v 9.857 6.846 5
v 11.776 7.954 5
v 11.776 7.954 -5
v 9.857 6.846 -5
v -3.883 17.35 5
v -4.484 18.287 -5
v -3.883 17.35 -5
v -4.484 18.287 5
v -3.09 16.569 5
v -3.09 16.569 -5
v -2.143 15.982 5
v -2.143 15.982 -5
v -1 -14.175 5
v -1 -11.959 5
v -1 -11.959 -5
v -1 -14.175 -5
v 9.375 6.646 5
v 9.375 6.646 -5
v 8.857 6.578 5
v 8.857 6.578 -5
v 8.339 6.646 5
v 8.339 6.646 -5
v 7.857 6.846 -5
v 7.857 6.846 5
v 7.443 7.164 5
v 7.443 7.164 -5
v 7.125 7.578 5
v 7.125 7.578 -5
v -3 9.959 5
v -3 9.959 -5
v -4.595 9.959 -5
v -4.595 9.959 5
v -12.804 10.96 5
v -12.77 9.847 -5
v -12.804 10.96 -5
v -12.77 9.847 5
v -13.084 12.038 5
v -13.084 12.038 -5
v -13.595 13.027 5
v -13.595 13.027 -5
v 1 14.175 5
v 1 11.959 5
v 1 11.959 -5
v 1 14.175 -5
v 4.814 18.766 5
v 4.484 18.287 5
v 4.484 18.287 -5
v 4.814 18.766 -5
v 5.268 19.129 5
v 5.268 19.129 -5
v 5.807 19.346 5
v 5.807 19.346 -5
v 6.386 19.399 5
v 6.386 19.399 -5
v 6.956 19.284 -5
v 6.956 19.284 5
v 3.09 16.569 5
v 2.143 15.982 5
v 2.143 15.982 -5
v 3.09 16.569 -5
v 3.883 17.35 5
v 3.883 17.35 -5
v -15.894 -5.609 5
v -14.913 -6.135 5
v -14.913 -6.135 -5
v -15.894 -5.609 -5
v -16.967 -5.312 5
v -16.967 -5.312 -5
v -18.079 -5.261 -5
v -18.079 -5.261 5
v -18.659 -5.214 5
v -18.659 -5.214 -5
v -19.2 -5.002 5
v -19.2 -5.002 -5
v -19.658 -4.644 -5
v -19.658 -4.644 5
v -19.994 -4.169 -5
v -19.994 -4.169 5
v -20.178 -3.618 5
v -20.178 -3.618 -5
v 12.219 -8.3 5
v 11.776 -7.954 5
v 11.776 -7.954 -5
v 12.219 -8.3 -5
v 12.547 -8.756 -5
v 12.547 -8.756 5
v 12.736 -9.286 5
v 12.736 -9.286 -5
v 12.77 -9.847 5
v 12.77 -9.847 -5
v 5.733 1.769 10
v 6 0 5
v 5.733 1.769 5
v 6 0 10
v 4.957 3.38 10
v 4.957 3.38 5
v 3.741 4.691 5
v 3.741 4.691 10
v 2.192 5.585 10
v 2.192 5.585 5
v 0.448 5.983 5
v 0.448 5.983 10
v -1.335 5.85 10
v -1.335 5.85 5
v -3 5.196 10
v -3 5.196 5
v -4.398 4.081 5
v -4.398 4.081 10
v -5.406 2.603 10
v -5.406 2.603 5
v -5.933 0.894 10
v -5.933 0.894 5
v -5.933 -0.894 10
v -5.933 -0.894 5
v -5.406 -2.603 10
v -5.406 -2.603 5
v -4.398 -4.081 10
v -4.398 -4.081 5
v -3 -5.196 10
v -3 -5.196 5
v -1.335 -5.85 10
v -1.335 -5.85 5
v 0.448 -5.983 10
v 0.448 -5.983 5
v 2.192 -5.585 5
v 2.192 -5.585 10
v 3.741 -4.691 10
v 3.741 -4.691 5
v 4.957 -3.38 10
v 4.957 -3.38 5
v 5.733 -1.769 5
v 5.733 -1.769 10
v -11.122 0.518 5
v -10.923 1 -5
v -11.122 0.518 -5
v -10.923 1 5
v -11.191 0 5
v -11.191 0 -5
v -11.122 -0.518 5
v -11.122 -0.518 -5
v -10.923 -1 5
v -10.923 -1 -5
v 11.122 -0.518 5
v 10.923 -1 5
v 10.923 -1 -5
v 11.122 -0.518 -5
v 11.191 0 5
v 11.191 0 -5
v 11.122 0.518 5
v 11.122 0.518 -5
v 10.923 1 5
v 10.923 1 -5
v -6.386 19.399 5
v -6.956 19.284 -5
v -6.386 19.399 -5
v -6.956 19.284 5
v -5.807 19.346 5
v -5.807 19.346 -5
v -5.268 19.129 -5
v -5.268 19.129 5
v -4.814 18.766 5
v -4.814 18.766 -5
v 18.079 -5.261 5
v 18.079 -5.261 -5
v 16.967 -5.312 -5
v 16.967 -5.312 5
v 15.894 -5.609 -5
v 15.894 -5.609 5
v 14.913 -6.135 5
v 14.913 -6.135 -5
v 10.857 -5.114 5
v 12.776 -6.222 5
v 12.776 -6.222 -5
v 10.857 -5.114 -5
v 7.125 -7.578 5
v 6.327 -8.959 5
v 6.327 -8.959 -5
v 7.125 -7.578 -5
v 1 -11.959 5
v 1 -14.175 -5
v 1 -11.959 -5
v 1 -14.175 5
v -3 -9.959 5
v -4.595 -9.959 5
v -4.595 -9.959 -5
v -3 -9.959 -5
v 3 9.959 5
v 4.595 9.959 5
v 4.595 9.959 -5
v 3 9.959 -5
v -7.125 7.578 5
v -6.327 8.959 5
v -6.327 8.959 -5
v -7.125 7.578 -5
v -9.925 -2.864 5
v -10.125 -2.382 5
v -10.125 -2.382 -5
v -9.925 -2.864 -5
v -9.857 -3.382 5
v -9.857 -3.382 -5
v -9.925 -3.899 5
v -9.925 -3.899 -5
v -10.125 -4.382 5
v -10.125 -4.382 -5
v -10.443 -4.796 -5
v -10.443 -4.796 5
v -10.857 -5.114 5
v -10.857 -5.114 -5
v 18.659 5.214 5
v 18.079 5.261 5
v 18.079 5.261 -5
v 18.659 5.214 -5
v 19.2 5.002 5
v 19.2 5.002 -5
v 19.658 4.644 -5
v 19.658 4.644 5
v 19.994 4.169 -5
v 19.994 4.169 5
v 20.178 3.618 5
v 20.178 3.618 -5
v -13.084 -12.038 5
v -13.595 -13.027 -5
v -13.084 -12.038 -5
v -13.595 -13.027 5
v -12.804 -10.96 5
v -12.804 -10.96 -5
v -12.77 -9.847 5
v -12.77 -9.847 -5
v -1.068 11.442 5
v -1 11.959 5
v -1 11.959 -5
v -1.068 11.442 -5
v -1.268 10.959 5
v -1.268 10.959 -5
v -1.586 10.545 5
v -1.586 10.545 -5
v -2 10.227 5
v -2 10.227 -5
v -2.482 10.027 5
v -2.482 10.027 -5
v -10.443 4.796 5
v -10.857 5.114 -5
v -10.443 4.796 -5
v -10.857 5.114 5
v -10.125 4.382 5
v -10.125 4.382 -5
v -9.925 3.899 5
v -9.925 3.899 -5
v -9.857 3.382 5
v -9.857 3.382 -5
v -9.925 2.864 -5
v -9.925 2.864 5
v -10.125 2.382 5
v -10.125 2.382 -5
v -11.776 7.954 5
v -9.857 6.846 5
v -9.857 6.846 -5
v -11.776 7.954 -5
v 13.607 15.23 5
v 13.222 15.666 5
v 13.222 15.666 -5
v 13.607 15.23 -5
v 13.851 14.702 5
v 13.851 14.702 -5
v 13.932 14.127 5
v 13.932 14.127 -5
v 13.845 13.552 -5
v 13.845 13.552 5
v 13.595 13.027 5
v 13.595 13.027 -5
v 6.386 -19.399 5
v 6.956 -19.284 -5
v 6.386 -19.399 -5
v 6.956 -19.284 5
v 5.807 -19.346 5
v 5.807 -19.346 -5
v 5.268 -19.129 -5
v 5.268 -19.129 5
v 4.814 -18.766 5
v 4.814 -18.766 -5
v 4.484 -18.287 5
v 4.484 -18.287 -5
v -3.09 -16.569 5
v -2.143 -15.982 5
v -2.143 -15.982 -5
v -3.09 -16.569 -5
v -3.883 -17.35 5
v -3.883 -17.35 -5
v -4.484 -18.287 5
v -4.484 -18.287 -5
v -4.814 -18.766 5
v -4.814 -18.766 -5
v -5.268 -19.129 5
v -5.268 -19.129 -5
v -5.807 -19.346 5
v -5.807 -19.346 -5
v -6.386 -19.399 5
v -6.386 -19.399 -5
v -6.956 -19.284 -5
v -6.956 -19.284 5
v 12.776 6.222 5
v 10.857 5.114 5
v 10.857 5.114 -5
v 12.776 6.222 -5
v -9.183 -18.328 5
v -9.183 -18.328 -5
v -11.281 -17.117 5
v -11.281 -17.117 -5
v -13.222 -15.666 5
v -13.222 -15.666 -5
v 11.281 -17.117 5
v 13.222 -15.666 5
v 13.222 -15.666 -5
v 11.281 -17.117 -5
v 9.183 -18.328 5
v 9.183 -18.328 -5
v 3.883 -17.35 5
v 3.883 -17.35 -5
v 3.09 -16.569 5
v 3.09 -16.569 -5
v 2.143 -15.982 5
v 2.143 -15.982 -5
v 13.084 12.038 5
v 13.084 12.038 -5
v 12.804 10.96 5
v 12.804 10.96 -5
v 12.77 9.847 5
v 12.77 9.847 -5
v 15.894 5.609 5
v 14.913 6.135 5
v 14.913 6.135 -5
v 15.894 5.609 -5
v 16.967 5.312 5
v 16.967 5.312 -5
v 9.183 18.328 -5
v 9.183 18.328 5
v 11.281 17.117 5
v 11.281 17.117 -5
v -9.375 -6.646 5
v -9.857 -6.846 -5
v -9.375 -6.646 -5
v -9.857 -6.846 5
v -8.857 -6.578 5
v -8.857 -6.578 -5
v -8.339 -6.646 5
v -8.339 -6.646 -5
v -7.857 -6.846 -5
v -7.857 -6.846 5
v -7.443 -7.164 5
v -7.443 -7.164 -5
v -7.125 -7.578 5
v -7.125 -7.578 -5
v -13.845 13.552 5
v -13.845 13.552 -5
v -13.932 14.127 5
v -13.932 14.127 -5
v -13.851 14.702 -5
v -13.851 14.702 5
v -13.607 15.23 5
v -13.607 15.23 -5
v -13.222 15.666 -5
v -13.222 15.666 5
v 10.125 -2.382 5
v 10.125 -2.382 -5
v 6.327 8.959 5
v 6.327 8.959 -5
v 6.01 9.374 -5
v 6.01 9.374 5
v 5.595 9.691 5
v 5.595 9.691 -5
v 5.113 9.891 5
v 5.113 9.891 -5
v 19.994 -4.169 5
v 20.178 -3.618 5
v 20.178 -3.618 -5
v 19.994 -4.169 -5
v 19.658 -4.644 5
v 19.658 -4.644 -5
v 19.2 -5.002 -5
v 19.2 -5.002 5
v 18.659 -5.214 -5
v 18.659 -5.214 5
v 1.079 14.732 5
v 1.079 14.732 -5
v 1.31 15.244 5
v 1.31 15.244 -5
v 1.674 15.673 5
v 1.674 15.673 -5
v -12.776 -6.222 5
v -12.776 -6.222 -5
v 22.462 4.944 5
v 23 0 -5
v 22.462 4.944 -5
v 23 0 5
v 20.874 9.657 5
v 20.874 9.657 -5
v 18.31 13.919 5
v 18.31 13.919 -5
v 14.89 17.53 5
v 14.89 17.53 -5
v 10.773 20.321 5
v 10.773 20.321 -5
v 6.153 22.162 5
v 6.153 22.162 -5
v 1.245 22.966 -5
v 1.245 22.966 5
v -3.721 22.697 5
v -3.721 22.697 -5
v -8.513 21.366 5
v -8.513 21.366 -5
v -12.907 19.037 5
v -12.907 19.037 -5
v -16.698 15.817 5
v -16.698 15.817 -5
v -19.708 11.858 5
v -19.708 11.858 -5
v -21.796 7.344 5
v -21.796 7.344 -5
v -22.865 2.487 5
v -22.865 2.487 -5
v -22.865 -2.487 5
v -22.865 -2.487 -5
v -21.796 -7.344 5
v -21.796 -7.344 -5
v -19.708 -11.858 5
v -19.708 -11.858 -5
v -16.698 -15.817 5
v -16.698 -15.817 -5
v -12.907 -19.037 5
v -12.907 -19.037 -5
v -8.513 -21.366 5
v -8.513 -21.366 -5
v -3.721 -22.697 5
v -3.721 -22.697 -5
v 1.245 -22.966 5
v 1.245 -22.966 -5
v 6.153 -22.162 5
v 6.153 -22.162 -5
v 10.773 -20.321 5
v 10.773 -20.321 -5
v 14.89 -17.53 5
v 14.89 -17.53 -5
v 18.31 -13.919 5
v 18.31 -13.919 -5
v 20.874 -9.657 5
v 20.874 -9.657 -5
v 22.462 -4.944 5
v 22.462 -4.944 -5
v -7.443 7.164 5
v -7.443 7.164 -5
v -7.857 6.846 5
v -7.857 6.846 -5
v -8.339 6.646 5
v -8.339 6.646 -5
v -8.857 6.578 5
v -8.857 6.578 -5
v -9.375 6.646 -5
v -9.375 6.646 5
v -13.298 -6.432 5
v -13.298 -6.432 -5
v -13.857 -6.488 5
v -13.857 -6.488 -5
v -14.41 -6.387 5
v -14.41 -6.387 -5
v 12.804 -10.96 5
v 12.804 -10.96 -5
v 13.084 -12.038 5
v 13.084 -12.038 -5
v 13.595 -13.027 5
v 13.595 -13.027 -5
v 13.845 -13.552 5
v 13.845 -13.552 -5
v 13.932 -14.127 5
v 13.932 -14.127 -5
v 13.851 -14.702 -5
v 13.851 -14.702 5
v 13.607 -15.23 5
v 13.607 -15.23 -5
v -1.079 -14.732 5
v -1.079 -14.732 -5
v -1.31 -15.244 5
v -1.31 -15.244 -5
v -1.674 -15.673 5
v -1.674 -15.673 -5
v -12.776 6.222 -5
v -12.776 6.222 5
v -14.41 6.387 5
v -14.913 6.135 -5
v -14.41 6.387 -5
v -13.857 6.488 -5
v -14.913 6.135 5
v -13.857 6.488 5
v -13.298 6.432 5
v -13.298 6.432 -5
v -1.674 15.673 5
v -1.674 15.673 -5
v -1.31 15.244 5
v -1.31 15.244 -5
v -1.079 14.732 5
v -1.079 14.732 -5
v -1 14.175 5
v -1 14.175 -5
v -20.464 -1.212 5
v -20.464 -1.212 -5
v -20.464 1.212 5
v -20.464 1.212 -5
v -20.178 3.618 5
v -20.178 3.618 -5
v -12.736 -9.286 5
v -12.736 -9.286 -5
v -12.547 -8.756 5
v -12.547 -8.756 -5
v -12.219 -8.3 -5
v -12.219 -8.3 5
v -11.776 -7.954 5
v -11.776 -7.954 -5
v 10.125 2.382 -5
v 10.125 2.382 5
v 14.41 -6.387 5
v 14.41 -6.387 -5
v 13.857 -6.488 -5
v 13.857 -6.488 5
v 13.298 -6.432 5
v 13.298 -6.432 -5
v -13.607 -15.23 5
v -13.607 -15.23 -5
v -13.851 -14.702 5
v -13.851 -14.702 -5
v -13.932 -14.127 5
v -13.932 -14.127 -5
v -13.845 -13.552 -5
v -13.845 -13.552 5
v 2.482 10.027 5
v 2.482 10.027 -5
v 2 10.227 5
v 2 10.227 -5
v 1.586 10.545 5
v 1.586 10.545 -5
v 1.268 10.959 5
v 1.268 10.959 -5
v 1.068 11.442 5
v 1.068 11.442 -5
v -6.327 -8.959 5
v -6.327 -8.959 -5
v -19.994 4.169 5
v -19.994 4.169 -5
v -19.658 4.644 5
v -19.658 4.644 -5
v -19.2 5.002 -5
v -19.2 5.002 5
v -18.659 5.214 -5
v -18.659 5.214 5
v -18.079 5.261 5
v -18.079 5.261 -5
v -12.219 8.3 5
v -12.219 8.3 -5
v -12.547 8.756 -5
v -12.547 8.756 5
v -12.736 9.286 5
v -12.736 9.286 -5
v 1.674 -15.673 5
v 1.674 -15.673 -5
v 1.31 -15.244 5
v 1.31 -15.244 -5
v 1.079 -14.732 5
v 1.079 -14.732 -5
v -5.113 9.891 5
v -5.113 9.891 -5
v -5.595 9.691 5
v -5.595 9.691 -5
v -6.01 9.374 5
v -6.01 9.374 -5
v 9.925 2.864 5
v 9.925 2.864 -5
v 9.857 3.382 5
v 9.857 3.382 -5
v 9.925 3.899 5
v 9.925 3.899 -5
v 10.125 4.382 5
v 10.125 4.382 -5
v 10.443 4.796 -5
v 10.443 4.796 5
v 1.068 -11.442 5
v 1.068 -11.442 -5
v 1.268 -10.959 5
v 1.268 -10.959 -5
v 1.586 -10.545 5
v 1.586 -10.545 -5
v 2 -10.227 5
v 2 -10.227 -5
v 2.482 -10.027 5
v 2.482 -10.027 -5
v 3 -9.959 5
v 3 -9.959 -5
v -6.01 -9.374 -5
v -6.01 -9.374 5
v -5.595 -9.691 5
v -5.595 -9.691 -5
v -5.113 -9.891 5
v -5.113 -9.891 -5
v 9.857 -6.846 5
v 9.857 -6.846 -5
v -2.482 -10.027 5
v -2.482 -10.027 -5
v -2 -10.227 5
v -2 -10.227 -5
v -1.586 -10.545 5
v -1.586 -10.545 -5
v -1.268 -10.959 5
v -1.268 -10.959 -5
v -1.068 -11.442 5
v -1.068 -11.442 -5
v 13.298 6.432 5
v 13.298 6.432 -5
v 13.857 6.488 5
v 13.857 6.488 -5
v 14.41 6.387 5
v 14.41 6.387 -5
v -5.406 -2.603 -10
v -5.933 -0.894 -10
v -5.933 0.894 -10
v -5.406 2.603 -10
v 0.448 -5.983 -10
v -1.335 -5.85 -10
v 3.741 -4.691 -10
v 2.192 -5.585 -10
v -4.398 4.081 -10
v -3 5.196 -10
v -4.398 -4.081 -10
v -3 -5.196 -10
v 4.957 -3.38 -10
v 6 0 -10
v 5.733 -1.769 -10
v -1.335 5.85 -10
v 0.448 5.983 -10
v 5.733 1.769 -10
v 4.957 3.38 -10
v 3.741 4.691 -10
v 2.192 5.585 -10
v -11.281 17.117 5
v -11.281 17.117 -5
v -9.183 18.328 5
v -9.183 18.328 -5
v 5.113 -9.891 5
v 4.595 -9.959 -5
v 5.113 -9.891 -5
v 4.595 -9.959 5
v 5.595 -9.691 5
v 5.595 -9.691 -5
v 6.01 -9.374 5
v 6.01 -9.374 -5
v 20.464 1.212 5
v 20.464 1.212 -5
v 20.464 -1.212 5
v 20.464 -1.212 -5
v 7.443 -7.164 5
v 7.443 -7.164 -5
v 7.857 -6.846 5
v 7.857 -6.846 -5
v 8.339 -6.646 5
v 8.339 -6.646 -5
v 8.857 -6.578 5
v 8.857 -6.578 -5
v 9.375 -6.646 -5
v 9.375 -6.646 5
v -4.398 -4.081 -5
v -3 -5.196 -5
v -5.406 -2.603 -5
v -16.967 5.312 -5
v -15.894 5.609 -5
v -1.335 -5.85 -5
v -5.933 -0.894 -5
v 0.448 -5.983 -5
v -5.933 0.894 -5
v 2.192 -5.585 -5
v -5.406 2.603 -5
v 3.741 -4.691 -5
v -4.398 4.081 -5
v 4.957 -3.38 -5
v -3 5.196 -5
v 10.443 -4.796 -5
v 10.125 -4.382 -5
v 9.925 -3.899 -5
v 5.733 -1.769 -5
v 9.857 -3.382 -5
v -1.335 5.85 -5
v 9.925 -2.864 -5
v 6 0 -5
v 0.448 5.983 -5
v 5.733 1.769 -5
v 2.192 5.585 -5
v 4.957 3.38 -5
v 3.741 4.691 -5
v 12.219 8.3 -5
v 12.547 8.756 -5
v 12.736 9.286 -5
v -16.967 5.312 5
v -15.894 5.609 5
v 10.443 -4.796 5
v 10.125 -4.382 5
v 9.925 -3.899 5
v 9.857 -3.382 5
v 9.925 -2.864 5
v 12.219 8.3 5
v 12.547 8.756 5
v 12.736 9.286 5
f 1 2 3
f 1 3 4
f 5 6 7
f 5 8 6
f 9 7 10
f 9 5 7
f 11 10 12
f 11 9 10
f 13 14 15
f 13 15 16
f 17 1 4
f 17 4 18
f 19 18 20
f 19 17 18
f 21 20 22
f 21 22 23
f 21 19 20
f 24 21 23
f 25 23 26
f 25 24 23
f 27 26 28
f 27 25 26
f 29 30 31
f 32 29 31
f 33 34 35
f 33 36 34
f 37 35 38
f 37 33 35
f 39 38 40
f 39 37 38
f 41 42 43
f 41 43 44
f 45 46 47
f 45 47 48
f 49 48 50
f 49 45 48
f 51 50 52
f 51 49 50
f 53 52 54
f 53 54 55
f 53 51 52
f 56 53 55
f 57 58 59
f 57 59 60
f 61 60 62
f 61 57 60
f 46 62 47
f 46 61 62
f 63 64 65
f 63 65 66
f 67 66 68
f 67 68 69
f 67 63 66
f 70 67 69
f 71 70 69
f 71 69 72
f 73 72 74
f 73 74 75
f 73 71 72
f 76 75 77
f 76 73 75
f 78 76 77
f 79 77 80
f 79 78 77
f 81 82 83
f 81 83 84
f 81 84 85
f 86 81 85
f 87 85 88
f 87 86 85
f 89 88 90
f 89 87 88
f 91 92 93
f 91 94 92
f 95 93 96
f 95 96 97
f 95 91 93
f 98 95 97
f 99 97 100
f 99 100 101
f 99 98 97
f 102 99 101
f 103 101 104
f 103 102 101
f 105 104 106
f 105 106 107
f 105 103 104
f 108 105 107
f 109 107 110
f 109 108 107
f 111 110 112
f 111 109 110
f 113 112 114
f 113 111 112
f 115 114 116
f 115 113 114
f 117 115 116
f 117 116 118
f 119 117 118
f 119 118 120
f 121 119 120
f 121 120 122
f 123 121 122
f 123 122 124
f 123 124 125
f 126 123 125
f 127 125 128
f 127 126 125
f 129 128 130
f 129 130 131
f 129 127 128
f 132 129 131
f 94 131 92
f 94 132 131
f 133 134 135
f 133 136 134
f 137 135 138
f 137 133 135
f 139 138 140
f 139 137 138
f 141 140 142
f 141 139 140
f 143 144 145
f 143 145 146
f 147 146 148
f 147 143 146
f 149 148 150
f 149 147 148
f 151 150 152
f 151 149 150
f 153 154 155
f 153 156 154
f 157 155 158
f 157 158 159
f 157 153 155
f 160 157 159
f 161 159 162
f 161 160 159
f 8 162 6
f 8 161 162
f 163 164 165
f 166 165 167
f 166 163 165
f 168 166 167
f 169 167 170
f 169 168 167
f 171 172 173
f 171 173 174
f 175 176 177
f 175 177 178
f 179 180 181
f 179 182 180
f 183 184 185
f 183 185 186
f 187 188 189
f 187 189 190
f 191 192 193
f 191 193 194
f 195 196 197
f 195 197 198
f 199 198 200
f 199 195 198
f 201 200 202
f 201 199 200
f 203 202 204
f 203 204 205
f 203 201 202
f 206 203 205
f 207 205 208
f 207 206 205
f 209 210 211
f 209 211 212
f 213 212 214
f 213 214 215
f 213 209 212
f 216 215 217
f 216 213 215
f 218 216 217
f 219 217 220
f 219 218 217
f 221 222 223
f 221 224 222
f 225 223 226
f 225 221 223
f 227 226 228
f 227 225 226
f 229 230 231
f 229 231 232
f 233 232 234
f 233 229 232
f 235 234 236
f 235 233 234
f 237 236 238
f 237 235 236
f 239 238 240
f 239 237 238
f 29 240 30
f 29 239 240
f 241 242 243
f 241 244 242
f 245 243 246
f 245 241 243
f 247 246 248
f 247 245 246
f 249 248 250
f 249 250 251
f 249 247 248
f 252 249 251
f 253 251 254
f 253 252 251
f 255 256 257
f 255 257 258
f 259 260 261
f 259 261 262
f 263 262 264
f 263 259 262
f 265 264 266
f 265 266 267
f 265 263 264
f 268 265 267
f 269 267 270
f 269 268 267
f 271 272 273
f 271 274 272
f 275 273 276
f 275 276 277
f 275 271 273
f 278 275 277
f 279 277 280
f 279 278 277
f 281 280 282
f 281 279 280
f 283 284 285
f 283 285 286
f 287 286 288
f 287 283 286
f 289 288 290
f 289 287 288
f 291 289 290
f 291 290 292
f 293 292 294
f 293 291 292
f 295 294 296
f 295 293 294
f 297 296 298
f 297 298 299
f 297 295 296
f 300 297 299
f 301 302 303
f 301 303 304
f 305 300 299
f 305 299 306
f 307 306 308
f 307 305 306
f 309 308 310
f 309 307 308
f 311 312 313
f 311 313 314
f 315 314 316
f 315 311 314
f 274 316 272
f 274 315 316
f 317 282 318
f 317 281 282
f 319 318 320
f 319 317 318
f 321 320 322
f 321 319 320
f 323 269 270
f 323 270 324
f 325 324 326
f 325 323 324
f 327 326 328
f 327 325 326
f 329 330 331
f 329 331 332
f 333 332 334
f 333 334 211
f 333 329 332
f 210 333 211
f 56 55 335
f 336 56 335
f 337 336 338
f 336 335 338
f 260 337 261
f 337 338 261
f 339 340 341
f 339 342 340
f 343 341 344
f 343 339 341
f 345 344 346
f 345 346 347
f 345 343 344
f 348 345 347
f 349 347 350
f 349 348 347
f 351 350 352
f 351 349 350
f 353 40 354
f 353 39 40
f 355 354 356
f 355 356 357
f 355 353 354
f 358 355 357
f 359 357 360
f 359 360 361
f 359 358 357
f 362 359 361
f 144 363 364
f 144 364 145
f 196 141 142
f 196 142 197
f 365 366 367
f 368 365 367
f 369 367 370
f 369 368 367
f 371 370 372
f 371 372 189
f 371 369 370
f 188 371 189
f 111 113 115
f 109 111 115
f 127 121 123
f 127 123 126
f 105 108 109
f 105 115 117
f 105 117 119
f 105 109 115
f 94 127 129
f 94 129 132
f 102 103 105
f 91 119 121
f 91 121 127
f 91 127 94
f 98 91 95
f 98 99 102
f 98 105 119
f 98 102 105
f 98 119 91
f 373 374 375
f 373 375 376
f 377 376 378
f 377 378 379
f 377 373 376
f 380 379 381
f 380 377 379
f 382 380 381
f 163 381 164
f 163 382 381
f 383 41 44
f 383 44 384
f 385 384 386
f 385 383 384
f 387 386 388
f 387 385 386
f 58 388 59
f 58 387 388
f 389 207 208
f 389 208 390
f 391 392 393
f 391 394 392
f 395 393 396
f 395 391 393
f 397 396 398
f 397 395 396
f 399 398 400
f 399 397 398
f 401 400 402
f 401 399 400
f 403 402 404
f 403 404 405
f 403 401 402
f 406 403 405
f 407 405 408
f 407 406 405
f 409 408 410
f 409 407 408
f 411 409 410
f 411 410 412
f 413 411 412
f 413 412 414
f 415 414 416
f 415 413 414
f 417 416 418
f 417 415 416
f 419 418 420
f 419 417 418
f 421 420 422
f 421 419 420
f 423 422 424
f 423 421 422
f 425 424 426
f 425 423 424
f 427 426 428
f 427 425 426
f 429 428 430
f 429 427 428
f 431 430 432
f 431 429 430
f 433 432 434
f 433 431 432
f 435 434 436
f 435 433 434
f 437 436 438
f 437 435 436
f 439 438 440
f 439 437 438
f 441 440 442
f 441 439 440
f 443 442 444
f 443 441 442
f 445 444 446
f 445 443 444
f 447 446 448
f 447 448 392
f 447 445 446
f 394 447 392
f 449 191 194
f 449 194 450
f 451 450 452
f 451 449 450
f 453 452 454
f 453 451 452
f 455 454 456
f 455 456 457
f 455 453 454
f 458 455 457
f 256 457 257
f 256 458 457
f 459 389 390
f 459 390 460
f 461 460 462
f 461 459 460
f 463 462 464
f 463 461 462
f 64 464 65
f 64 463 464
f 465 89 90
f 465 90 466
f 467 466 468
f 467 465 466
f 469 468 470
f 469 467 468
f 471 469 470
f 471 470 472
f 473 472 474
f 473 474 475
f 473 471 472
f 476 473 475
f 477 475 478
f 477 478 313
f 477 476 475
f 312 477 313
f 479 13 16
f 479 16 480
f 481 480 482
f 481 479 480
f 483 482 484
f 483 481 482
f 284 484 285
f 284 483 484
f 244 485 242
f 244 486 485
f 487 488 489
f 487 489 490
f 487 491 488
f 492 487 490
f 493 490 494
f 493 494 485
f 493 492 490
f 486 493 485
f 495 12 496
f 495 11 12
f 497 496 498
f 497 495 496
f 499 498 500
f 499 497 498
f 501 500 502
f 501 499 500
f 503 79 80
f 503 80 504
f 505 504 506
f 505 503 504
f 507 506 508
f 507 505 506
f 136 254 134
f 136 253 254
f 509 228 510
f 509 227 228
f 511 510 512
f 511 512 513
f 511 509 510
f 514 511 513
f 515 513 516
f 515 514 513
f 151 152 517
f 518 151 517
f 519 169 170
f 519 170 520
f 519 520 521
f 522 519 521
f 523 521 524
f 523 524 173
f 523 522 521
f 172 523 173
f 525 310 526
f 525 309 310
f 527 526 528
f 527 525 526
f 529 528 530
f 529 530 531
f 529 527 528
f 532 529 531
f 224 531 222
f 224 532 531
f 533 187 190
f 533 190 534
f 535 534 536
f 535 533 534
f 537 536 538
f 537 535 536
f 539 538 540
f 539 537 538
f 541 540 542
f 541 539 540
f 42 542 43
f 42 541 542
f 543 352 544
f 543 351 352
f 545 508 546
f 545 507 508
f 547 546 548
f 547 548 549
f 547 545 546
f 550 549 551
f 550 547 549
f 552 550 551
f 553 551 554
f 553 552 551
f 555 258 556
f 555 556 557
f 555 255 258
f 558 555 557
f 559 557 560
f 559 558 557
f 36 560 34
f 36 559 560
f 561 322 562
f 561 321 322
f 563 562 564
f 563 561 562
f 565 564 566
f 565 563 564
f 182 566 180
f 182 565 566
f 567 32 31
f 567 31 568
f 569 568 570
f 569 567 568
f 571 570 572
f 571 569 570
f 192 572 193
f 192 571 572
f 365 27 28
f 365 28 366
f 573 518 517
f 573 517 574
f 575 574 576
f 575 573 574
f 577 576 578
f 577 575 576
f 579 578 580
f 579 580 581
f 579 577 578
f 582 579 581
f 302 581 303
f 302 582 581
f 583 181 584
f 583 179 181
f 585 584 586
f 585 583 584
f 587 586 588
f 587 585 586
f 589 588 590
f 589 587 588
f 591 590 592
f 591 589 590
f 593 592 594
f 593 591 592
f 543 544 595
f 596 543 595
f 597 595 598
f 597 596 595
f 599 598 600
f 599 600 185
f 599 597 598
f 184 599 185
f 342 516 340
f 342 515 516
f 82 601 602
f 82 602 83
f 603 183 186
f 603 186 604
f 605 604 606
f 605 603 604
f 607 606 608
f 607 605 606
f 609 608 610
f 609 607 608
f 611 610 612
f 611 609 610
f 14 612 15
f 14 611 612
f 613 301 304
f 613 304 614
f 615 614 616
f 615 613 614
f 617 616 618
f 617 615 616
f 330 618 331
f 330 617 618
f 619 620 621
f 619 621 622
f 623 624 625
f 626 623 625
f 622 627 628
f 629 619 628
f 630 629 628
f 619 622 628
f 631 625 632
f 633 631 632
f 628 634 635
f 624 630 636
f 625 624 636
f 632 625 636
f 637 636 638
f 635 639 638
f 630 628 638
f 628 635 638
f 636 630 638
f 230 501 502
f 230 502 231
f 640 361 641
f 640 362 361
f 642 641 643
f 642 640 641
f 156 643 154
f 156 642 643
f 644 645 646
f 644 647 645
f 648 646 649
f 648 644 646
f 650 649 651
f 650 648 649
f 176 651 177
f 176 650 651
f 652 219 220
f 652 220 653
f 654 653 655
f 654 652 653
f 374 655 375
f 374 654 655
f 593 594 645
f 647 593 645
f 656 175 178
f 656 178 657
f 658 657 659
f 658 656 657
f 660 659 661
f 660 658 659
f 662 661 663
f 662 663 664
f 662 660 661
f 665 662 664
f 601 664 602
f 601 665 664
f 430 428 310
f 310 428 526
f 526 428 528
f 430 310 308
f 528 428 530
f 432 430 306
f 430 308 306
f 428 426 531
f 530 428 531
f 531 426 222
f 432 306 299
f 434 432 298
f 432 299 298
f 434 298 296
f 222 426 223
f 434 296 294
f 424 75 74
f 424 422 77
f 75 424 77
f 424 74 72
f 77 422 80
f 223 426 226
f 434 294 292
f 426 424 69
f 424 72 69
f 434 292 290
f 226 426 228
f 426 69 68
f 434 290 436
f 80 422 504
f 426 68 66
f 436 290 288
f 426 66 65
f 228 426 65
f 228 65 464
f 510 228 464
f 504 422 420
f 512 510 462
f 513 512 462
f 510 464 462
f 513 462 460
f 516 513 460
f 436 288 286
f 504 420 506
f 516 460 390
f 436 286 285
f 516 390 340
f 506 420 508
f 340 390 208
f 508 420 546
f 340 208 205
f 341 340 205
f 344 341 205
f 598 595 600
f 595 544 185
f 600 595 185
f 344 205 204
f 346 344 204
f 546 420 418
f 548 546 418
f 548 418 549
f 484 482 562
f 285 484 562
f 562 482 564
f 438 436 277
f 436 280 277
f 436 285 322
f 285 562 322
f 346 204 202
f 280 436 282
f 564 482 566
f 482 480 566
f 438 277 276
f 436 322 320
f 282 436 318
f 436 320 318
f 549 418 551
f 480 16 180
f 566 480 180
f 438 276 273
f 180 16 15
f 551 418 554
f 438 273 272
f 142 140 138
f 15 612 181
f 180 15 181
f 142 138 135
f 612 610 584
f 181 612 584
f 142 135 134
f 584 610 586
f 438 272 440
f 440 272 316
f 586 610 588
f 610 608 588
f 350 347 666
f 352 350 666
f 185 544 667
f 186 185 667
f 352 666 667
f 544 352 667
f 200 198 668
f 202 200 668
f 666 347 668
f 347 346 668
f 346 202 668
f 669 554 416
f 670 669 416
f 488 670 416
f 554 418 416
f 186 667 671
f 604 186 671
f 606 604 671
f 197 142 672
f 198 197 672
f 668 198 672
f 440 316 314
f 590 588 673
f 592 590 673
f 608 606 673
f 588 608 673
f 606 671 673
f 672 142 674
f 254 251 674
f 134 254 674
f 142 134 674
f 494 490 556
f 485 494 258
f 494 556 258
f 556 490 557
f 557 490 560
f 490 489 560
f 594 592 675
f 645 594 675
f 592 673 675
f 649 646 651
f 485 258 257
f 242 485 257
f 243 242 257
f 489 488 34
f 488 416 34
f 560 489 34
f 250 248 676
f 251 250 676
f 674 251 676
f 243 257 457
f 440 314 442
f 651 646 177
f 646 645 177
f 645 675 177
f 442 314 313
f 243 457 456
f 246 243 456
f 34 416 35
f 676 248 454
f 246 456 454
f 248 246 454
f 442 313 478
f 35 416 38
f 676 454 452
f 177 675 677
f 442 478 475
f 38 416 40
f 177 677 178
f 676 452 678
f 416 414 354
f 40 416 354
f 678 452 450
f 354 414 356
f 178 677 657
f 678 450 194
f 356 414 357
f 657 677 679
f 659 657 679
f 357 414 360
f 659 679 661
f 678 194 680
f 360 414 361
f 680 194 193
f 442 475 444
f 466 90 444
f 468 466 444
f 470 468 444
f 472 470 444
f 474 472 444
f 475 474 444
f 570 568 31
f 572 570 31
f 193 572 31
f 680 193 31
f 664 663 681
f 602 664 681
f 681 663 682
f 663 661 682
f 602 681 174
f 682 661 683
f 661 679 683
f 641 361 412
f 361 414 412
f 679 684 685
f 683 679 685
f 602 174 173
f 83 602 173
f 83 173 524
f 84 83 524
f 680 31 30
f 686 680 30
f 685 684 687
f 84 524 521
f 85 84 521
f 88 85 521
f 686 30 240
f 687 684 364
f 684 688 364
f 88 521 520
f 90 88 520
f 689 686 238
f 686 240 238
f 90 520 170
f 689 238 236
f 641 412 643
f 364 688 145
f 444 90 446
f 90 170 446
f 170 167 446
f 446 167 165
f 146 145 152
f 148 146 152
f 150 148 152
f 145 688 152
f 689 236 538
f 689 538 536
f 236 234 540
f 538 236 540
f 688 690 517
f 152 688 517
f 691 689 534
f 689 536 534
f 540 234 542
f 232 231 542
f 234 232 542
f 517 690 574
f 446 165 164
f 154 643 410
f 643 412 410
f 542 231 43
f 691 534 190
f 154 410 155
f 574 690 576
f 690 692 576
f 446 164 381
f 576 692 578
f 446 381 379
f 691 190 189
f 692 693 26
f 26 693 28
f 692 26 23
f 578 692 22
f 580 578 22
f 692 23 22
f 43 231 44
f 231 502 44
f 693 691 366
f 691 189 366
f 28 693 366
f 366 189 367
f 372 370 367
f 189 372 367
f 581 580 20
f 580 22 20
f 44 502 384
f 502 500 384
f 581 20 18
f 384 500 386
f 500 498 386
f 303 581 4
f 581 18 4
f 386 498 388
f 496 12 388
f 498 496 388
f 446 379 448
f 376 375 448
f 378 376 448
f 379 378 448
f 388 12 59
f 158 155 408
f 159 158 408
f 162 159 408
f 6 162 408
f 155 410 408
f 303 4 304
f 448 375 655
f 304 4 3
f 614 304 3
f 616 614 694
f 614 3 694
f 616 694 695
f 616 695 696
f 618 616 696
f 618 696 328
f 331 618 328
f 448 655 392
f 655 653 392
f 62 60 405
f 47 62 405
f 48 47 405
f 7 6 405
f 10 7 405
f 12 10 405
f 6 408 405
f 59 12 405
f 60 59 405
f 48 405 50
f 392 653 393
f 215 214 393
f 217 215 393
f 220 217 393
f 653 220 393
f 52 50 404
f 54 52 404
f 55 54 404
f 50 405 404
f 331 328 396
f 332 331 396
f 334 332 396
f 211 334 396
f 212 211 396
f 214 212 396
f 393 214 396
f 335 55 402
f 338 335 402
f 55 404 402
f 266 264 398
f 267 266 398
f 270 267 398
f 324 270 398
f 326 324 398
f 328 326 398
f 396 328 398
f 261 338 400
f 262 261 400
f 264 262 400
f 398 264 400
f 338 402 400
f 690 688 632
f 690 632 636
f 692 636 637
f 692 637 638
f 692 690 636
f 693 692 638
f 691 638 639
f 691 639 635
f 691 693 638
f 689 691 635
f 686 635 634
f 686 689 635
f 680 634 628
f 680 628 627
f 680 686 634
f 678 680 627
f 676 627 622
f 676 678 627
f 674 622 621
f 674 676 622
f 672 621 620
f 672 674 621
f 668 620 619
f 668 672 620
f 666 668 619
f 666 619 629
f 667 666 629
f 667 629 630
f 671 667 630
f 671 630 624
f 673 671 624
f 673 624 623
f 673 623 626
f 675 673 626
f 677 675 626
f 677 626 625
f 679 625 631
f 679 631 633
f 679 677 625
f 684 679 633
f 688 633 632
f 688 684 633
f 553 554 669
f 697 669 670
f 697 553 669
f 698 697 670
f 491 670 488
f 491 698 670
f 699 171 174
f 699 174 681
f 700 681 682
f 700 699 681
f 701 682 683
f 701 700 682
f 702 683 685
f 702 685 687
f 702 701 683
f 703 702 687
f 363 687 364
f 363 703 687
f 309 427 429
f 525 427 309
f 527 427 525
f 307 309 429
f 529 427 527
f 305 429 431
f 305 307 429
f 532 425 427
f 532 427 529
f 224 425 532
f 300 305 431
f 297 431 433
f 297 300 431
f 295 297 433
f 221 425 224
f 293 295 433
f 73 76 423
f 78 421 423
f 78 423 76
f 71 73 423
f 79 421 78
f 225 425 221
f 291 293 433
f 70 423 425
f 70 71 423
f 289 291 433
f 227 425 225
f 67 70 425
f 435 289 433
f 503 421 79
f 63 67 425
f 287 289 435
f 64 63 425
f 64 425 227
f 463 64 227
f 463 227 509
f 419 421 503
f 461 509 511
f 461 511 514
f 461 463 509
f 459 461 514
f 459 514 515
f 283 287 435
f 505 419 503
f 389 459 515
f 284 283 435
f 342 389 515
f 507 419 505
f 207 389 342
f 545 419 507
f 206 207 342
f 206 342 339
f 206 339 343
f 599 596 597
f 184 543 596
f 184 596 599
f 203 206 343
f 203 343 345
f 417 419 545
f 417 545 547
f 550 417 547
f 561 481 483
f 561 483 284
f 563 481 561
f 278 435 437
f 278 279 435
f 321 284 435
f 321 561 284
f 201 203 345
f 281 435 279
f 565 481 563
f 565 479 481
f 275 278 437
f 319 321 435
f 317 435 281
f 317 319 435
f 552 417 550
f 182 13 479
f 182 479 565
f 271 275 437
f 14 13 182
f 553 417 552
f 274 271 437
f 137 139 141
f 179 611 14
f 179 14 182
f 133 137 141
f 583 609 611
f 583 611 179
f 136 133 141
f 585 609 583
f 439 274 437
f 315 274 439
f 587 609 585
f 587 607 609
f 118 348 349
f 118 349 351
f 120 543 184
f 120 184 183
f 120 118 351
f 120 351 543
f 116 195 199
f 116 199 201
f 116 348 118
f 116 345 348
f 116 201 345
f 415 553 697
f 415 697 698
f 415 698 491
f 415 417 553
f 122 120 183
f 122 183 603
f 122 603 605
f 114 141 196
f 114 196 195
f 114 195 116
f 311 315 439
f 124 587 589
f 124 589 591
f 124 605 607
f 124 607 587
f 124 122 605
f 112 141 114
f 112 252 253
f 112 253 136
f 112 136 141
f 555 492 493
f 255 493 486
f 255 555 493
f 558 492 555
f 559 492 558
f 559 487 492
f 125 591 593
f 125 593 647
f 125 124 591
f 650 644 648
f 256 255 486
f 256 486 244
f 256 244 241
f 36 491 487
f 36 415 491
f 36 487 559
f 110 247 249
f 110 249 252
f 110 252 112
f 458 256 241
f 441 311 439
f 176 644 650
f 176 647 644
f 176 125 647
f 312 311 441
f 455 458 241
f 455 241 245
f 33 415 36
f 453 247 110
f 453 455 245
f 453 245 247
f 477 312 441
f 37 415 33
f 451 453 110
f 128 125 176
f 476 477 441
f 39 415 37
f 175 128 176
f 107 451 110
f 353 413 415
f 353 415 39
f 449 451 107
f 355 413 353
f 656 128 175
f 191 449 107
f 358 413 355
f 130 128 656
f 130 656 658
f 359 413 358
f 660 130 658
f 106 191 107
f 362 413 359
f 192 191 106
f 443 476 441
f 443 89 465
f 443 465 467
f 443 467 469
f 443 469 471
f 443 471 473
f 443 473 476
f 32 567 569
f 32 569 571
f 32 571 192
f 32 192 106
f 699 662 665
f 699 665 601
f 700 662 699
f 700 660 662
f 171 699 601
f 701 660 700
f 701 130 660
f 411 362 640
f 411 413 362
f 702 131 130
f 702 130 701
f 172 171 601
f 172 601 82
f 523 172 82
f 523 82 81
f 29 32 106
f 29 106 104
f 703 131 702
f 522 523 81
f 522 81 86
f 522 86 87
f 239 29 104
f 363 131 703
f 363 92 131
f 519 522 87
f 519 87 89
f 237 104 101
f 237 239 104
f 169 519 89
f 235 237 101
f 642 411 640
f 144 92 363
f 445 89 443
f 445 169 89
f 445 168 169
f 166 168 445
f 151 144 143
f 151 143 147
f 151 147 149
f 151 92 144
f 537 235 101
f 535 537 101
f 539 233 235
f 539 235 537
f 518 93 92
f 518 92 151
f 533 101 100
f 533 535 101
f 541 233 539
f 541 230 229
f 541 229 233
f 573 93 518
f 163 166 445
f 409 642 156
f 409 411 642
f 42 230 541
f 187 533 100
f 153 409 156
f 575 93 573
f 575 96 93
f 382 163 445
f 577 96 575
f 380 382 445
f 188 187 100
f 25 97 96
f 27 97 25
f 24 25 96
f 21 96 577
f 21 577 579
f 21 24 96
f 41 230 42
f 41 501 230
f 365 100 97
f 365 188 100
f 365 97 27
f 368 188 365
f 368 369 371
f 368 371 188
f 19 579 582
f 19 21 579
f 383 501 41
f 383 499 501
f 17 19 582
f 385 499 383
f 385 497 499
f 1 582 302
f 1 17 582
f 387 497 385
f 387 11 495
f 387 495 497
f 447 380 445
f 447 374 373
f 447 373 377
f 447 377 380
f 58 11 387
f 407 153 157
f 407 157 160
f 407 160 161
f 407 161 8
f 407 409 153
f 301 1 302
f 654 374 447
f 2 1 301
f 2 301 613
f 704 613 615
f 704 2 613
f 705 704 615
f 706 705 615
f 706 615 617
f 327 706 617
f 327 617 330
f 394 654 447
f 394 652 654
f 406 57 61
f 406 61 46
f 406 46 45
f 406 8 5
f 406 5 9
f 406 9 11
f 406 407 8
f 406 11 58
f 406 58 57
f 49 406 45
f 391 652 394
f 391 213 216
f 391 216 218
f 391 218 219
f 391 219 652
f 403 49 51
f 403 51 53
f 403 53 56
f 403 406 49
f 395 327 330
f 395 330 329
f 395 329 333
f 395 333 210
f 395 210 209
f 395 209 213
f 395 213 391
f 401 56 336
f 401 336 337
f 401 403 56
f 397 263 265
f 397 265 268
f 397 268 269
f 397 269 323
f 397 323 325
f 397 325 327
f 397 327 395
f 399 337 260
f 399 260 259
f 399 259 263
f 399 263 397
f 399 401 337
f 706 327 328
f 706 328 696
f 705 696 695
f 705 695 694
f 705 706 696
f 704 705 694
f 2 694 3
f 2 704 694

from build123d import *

# Parameters (mm, degrees)
SKETCH1_R           = 6
BOSS_EXTRUDE1_DEPTH = 10
SKETCH1_7_R         = 23
SKETCH1_7_R_2       = 6
BOSS_EXTRUDE3_DEPTH = 5


with BuildPart() as part:
    # Sketch1 → Boss-Extrude1 (new, symmetric)
    with BuildSketch(Plane.XY):
        Circle(SKETCH1_R)
    extrude(amount=BOSS_EXTRUDE1_DEPTH, both=True)

    # Sketch1<7> → Boss-Extrude3 (add, symmetric)
    with BuildSketch(Plane.XY):
        Circle(SKETCH1_7_R)
        Circle(SKETCH1_7_R_2, mode=Mode.SUBTRACT)
        with BuildLine():
            Line((-1, 14.17544468), (-1, 11.959292144))
            ThreePointArc((-1, 11.959292144), (-1.585786438, 10.545078581), (-3, 9.959292144))
            Line((-3, 9.959292144), (-4.595299462, 9.959292144))
            ThreePointArc((-4.595299462, 9.959292144), (-5.595299462, 9.691342951), (-6.327350269, 8.959292144))
            Line((-6.327350269, 8.959292144), (-7.125, 7.577722283))
            ThreePointArc((-7.125, 7.577722283), (-8.339412717, 6.645870631), (-9.857050808, 6.845671476))
            Line((-9.857050808, 6.845671476), (-11.776295203, 7.953747744))
            ThreePointArc((-11.776295203, 7.953747744), (-12.547269557, 8.756470926), (-12.769788224, 9.846998965))
            ThreePointArc((-12.769788224, 9.846998965), (-12.914018091, 11.506667717), (-13.595491338, 13.02683114))
            ThreePointArc((-13.595491338, 13.02683114), (-13.912573816, 14.417625499), (-13.222255731, 15.66594885))
            ThreePointArc((-13.222255731, 15.66594885), (-10.25, 17.753520778), (-6.955981813, 19.283783784))
            ThreePointArc((-6.955981813, 19.283783784), (-5.529743036, 19.257455106), (-4.483821029, 18.287456446))
            ThreePointArc((-4.483821029, 18.287456446), (-3.50805751, 16.937201591), (-2.142857143, 15.982460485))
            ThreePointArc((-2.142857143, 15.982460485), (-1.309691491, 15.244489647), (-1, 14.17544468))
        make_face(mode=Mode.SUBTRACT)
        with BuildLine():
            Line((4.595299462, 9.959292144), (3, 9.959292144))
            ThreePointArc((3, 9.959292144), (1.585786438, 10.545078581), (1, 11.959292144))
            Line((1, 11.959292144), (1, 14.17544468))
            ThreePointArc((1, 14.17544468), (1.309691491, 15.244489647), (2.142857143, 15.982460485))
            ThreePointArc((2.142857143, 15.982460485), (3.50805751, 16.937201591), (4.483821029, 18.287456446))
            ThreePointArc((4.483821029, 18.287456446), (5.529743036, 19.257455106), (6.955981813, 19.283783784))
            ThreePointArc((6.955981813, 19.283783784), (10.25, 17.753520778), (13.222255731, 15.66594885))
            ThreePointArc((13.222255731, 15.66594885), (13.912573816, 14.417625499), (13.595491338, 13.02683114))
            ThreePointArc((13.595491338, 13.02683114), (12.914018091, 11.506667717), (12.769788224, 9.846998965))
            ThreePointArc((12.769788224, 9.846998965), (12.547269557, 8.756470926), (11.776295203, 7.953747744))
            Line((11.776295203, 7.953747744), (9.857050808, 6.845671476))
            ThreePointArc((9.857050808, 6.845671476), (8.339412717, 6.645870631), (7.125, 7.577722283))
            Line((7.125, 7.577722283), (6.327350269, 8.959292144))
            ThreePointArc((6.327350269, 8.959292144), (5.595299462, 9.691342951), (4.595299462, 9.959292144))
        make_face(mode=Mode.SUBTRACT)
        with BuildLine():
            Line((-10.922649731, -1), (-10.125, -2.38156986))
            ThreePointArc((-10.125, -2.38156986), (-9.925199155, -3.899207951), (-10.857050808, -5.113620668))
            Line((-10.857050808, -5.113620668), (-12.776295203, -6.221696936))
            ThreePointArc((-12.776295203, -6.221696936), (-13.856961048, -6.488018722), (-14.912645367, -6.13546152))
            ThreePointArc((-14.912645367, -6.13546152), (-16.422075601, -5.430533874), (-18.079312367, -5.260625306))
            ThreePointArc((-18.079312367, -5.260625306), (-19.442316853, -4.839829607), (-20.178237544, -3.617834934))
            ThreePointArc((-20.178237544, -3.617834934), (-20.5, 0), (-20.178237544, 3.617834934))
            ThreePointArc((-20.178237544, 3.617834934), (-19.442316853, 4.839829607), (-18.079312367, 5.260625306))
            ThreePointArc((-18.079312367, 5.260625306), (-16.422075601, 5.430533874), (-14.912645367, 6.13546152))
            ThreePointArc((-14.912645367, 6.13546152), (-13.856961048, 6.488018722), (-12.776295203, 6.221696936))
            Line((-12.776295203, 6.221696936), (-10.857050808, 5.113620668))
            ThreePointArc((-10.857050808, 5.113620668), (-9.925199155, 3.899207951), (-10.125, 2.38156986))
            Line((-10.125, 2.38156986), (-10.922649731, 1))
            ThreePointArc((-10.922649731, 1), (-11.190598923, 0), (-10.922649731, -1))
        make_face(mode=Mode.SUBTRACT)
        with BuildLine():
            Line((-4.595299462, -9.959292144), (-3, -9.959292144))
            ThreePointArc((-3, -9.959292144), (-1.585786438, -10.545078581), (-1, -11.959292144))
            Line((-1, -11.959292144), (-1, -14.17544468))
            ThreePointArc((-1, -14.17544468), (-1.309691491, -15.244489647), (-2.142857143, -15.982460485))
            ThreePointArc((-2.142857143, -15.982460485), (-3.50805751, -16.937201591), (-4.483821029, -18.287456446))
            ThreePointArc((-4.483821029, -18.287456446), (-5.529743036, -19.257455106), (-6.955981813, -19.283783784))
            ThreePointArc((-6.955981813, -19.283783784), (-10.25, -17.753520778), (-13.222255731, -15.66594885))
            ThreePointArc((-13.222255731, -15.66594885), (-13.912573816, -14.417625499), (-13.595491338, -13.02683114))
            ThreePointArc((-13.595491338, -13.02683114), (-12.914018091, -11.506667717), (-12.769788224, -9.846998965))
            ThreePointArc((-12.769788224, -9.846998965), (-12.547269557, -8.756470926), (-11.776295203, -7.953747744))
            Line((-11.776295203, -7.953747744), (-9.857050808, -6.845671476))
            ThreePointArc((-9.857050808, -6.845671476), (-8.339412717, -6.645870631), (-7.125, -7.577722283))
            Line((-7.125, -7.577722283), (-6.327350269, -8.959292144))
            ThreePointArc((-6.327350269, -8.959292144), (-5.595299462, -9.691342951), (-4.595299462, -9.959292144))
        make_face(mode=Mode.SUBTRACT)
        with BuildLine():
            Line((6.327350269, -8.959292144), (7.125, -7.577722283))
            ThreePointArc((7.125, -7.577722283), (8.339412717, -6.645870631), (9.857050808, -6.845671476))
            Line((9.857050808, -6.845671476), (11.776295203, -7.953747744))
            ThreePointArc((11.776295203, -7.953747744), (12.547269557, -8.756470926), (12.769788224, -9.846998965))
            ThreePointArc((12.769788224, -9.846998965), (12.914018091, -11.506667717), (13.595491338, -13.02683114))
            ThreePointArc((13.595491338, -13.02683114), (13.912573816, -14.417625499), (13.222255731, -15.66594885))
            ThreePointArc((13.222255731, -15.66594885), (10.25, -17.753520778), (6.955981813, -19.283783784))
            ThreePointArc((6.955981813, -19.283783784), (5.529743036, -19.257455106), (4.483821029, -18.287456446))
            ThreePointArc((4.483821029, -18.287456446), (3.50805751, -16.937201591), (2.142857143, -15.982460485))
            ThreePointArc((2.142857143, -15.982460485), (1.309691491, -15.244489647), (1, -14.17544468))
            Line((1, -14.17544468), (1, -11.959292144))
            ThreePointArc((1, -11.959292144), (1.585786438, -10.545078581), (3, -9.959292144))
            Line((3, -9.959292144), (4.595299462, -9.959292144))
            ThreePointArc((4.595299462, -9.959292144), (5.595299462, -9.691342951), (6.327350269, -8.959292144))
        make_face(mode=Mode.SUBTRACT)
        with BuildLine():
            Line((10.922649731, 1), (10.125, 2.38156986))
            ThreePointArc((10.125, 2.38156986), (9.925199155, 3.899207951), (10.857050808, 5.113620668))
            Line((10.857050808, 5.113620668), (12.776295203, 6.221696936))
            ThreePointArc((12.776295203, 6.221696936), (13.856961048, 6.488018722), (14.912645367, 6.13546152))
            ThreePointArc((14.912645367, 6.13546152), (16.422075601, 5.430533874), (18.079312367, 5.260625306))
            ThreePointArc((18.079312367, 5.260625306), (19.442316853, 4.839829607), (20.178237544, 3.617834934))
            ThreePointArc((20.178237544, 3.617834934), (20.5, 0), (20.178237544, -3.617834934))
            ThreePointArc((20.178237544, -3.617834934), (19.442316853, -4.839829607), (18.079312367, -5.260625306))
            ThreePointArc((18.079312367, -5.260625306), (16.422075601, -5.430533874), (14.912645367, -6.13546152))
            ThreePointArc((14.912645367, -6.13546152), (13.856961048, -6.488018722), (12.776295203, -6.221696936))
            Line((12.776295203, -6.221696936), (10.857050808, -5.113620668))
            ThreePointArc((10.857050808, -5.113620668), (9.925199155, -3.899207951), (10.125, -2.38156986))
            Line((10.125, -2.38156986), (10.922649731, -1))
            ThreePointArc((10.922649731, -1), (11.190598923, 0), (10.922649731, 1))
        make_face(mode=Mode.SUBTRACT)
    extrude(amount=BOSS_EXTRUDE3_DEPTH, both=True)


solid = part.part
